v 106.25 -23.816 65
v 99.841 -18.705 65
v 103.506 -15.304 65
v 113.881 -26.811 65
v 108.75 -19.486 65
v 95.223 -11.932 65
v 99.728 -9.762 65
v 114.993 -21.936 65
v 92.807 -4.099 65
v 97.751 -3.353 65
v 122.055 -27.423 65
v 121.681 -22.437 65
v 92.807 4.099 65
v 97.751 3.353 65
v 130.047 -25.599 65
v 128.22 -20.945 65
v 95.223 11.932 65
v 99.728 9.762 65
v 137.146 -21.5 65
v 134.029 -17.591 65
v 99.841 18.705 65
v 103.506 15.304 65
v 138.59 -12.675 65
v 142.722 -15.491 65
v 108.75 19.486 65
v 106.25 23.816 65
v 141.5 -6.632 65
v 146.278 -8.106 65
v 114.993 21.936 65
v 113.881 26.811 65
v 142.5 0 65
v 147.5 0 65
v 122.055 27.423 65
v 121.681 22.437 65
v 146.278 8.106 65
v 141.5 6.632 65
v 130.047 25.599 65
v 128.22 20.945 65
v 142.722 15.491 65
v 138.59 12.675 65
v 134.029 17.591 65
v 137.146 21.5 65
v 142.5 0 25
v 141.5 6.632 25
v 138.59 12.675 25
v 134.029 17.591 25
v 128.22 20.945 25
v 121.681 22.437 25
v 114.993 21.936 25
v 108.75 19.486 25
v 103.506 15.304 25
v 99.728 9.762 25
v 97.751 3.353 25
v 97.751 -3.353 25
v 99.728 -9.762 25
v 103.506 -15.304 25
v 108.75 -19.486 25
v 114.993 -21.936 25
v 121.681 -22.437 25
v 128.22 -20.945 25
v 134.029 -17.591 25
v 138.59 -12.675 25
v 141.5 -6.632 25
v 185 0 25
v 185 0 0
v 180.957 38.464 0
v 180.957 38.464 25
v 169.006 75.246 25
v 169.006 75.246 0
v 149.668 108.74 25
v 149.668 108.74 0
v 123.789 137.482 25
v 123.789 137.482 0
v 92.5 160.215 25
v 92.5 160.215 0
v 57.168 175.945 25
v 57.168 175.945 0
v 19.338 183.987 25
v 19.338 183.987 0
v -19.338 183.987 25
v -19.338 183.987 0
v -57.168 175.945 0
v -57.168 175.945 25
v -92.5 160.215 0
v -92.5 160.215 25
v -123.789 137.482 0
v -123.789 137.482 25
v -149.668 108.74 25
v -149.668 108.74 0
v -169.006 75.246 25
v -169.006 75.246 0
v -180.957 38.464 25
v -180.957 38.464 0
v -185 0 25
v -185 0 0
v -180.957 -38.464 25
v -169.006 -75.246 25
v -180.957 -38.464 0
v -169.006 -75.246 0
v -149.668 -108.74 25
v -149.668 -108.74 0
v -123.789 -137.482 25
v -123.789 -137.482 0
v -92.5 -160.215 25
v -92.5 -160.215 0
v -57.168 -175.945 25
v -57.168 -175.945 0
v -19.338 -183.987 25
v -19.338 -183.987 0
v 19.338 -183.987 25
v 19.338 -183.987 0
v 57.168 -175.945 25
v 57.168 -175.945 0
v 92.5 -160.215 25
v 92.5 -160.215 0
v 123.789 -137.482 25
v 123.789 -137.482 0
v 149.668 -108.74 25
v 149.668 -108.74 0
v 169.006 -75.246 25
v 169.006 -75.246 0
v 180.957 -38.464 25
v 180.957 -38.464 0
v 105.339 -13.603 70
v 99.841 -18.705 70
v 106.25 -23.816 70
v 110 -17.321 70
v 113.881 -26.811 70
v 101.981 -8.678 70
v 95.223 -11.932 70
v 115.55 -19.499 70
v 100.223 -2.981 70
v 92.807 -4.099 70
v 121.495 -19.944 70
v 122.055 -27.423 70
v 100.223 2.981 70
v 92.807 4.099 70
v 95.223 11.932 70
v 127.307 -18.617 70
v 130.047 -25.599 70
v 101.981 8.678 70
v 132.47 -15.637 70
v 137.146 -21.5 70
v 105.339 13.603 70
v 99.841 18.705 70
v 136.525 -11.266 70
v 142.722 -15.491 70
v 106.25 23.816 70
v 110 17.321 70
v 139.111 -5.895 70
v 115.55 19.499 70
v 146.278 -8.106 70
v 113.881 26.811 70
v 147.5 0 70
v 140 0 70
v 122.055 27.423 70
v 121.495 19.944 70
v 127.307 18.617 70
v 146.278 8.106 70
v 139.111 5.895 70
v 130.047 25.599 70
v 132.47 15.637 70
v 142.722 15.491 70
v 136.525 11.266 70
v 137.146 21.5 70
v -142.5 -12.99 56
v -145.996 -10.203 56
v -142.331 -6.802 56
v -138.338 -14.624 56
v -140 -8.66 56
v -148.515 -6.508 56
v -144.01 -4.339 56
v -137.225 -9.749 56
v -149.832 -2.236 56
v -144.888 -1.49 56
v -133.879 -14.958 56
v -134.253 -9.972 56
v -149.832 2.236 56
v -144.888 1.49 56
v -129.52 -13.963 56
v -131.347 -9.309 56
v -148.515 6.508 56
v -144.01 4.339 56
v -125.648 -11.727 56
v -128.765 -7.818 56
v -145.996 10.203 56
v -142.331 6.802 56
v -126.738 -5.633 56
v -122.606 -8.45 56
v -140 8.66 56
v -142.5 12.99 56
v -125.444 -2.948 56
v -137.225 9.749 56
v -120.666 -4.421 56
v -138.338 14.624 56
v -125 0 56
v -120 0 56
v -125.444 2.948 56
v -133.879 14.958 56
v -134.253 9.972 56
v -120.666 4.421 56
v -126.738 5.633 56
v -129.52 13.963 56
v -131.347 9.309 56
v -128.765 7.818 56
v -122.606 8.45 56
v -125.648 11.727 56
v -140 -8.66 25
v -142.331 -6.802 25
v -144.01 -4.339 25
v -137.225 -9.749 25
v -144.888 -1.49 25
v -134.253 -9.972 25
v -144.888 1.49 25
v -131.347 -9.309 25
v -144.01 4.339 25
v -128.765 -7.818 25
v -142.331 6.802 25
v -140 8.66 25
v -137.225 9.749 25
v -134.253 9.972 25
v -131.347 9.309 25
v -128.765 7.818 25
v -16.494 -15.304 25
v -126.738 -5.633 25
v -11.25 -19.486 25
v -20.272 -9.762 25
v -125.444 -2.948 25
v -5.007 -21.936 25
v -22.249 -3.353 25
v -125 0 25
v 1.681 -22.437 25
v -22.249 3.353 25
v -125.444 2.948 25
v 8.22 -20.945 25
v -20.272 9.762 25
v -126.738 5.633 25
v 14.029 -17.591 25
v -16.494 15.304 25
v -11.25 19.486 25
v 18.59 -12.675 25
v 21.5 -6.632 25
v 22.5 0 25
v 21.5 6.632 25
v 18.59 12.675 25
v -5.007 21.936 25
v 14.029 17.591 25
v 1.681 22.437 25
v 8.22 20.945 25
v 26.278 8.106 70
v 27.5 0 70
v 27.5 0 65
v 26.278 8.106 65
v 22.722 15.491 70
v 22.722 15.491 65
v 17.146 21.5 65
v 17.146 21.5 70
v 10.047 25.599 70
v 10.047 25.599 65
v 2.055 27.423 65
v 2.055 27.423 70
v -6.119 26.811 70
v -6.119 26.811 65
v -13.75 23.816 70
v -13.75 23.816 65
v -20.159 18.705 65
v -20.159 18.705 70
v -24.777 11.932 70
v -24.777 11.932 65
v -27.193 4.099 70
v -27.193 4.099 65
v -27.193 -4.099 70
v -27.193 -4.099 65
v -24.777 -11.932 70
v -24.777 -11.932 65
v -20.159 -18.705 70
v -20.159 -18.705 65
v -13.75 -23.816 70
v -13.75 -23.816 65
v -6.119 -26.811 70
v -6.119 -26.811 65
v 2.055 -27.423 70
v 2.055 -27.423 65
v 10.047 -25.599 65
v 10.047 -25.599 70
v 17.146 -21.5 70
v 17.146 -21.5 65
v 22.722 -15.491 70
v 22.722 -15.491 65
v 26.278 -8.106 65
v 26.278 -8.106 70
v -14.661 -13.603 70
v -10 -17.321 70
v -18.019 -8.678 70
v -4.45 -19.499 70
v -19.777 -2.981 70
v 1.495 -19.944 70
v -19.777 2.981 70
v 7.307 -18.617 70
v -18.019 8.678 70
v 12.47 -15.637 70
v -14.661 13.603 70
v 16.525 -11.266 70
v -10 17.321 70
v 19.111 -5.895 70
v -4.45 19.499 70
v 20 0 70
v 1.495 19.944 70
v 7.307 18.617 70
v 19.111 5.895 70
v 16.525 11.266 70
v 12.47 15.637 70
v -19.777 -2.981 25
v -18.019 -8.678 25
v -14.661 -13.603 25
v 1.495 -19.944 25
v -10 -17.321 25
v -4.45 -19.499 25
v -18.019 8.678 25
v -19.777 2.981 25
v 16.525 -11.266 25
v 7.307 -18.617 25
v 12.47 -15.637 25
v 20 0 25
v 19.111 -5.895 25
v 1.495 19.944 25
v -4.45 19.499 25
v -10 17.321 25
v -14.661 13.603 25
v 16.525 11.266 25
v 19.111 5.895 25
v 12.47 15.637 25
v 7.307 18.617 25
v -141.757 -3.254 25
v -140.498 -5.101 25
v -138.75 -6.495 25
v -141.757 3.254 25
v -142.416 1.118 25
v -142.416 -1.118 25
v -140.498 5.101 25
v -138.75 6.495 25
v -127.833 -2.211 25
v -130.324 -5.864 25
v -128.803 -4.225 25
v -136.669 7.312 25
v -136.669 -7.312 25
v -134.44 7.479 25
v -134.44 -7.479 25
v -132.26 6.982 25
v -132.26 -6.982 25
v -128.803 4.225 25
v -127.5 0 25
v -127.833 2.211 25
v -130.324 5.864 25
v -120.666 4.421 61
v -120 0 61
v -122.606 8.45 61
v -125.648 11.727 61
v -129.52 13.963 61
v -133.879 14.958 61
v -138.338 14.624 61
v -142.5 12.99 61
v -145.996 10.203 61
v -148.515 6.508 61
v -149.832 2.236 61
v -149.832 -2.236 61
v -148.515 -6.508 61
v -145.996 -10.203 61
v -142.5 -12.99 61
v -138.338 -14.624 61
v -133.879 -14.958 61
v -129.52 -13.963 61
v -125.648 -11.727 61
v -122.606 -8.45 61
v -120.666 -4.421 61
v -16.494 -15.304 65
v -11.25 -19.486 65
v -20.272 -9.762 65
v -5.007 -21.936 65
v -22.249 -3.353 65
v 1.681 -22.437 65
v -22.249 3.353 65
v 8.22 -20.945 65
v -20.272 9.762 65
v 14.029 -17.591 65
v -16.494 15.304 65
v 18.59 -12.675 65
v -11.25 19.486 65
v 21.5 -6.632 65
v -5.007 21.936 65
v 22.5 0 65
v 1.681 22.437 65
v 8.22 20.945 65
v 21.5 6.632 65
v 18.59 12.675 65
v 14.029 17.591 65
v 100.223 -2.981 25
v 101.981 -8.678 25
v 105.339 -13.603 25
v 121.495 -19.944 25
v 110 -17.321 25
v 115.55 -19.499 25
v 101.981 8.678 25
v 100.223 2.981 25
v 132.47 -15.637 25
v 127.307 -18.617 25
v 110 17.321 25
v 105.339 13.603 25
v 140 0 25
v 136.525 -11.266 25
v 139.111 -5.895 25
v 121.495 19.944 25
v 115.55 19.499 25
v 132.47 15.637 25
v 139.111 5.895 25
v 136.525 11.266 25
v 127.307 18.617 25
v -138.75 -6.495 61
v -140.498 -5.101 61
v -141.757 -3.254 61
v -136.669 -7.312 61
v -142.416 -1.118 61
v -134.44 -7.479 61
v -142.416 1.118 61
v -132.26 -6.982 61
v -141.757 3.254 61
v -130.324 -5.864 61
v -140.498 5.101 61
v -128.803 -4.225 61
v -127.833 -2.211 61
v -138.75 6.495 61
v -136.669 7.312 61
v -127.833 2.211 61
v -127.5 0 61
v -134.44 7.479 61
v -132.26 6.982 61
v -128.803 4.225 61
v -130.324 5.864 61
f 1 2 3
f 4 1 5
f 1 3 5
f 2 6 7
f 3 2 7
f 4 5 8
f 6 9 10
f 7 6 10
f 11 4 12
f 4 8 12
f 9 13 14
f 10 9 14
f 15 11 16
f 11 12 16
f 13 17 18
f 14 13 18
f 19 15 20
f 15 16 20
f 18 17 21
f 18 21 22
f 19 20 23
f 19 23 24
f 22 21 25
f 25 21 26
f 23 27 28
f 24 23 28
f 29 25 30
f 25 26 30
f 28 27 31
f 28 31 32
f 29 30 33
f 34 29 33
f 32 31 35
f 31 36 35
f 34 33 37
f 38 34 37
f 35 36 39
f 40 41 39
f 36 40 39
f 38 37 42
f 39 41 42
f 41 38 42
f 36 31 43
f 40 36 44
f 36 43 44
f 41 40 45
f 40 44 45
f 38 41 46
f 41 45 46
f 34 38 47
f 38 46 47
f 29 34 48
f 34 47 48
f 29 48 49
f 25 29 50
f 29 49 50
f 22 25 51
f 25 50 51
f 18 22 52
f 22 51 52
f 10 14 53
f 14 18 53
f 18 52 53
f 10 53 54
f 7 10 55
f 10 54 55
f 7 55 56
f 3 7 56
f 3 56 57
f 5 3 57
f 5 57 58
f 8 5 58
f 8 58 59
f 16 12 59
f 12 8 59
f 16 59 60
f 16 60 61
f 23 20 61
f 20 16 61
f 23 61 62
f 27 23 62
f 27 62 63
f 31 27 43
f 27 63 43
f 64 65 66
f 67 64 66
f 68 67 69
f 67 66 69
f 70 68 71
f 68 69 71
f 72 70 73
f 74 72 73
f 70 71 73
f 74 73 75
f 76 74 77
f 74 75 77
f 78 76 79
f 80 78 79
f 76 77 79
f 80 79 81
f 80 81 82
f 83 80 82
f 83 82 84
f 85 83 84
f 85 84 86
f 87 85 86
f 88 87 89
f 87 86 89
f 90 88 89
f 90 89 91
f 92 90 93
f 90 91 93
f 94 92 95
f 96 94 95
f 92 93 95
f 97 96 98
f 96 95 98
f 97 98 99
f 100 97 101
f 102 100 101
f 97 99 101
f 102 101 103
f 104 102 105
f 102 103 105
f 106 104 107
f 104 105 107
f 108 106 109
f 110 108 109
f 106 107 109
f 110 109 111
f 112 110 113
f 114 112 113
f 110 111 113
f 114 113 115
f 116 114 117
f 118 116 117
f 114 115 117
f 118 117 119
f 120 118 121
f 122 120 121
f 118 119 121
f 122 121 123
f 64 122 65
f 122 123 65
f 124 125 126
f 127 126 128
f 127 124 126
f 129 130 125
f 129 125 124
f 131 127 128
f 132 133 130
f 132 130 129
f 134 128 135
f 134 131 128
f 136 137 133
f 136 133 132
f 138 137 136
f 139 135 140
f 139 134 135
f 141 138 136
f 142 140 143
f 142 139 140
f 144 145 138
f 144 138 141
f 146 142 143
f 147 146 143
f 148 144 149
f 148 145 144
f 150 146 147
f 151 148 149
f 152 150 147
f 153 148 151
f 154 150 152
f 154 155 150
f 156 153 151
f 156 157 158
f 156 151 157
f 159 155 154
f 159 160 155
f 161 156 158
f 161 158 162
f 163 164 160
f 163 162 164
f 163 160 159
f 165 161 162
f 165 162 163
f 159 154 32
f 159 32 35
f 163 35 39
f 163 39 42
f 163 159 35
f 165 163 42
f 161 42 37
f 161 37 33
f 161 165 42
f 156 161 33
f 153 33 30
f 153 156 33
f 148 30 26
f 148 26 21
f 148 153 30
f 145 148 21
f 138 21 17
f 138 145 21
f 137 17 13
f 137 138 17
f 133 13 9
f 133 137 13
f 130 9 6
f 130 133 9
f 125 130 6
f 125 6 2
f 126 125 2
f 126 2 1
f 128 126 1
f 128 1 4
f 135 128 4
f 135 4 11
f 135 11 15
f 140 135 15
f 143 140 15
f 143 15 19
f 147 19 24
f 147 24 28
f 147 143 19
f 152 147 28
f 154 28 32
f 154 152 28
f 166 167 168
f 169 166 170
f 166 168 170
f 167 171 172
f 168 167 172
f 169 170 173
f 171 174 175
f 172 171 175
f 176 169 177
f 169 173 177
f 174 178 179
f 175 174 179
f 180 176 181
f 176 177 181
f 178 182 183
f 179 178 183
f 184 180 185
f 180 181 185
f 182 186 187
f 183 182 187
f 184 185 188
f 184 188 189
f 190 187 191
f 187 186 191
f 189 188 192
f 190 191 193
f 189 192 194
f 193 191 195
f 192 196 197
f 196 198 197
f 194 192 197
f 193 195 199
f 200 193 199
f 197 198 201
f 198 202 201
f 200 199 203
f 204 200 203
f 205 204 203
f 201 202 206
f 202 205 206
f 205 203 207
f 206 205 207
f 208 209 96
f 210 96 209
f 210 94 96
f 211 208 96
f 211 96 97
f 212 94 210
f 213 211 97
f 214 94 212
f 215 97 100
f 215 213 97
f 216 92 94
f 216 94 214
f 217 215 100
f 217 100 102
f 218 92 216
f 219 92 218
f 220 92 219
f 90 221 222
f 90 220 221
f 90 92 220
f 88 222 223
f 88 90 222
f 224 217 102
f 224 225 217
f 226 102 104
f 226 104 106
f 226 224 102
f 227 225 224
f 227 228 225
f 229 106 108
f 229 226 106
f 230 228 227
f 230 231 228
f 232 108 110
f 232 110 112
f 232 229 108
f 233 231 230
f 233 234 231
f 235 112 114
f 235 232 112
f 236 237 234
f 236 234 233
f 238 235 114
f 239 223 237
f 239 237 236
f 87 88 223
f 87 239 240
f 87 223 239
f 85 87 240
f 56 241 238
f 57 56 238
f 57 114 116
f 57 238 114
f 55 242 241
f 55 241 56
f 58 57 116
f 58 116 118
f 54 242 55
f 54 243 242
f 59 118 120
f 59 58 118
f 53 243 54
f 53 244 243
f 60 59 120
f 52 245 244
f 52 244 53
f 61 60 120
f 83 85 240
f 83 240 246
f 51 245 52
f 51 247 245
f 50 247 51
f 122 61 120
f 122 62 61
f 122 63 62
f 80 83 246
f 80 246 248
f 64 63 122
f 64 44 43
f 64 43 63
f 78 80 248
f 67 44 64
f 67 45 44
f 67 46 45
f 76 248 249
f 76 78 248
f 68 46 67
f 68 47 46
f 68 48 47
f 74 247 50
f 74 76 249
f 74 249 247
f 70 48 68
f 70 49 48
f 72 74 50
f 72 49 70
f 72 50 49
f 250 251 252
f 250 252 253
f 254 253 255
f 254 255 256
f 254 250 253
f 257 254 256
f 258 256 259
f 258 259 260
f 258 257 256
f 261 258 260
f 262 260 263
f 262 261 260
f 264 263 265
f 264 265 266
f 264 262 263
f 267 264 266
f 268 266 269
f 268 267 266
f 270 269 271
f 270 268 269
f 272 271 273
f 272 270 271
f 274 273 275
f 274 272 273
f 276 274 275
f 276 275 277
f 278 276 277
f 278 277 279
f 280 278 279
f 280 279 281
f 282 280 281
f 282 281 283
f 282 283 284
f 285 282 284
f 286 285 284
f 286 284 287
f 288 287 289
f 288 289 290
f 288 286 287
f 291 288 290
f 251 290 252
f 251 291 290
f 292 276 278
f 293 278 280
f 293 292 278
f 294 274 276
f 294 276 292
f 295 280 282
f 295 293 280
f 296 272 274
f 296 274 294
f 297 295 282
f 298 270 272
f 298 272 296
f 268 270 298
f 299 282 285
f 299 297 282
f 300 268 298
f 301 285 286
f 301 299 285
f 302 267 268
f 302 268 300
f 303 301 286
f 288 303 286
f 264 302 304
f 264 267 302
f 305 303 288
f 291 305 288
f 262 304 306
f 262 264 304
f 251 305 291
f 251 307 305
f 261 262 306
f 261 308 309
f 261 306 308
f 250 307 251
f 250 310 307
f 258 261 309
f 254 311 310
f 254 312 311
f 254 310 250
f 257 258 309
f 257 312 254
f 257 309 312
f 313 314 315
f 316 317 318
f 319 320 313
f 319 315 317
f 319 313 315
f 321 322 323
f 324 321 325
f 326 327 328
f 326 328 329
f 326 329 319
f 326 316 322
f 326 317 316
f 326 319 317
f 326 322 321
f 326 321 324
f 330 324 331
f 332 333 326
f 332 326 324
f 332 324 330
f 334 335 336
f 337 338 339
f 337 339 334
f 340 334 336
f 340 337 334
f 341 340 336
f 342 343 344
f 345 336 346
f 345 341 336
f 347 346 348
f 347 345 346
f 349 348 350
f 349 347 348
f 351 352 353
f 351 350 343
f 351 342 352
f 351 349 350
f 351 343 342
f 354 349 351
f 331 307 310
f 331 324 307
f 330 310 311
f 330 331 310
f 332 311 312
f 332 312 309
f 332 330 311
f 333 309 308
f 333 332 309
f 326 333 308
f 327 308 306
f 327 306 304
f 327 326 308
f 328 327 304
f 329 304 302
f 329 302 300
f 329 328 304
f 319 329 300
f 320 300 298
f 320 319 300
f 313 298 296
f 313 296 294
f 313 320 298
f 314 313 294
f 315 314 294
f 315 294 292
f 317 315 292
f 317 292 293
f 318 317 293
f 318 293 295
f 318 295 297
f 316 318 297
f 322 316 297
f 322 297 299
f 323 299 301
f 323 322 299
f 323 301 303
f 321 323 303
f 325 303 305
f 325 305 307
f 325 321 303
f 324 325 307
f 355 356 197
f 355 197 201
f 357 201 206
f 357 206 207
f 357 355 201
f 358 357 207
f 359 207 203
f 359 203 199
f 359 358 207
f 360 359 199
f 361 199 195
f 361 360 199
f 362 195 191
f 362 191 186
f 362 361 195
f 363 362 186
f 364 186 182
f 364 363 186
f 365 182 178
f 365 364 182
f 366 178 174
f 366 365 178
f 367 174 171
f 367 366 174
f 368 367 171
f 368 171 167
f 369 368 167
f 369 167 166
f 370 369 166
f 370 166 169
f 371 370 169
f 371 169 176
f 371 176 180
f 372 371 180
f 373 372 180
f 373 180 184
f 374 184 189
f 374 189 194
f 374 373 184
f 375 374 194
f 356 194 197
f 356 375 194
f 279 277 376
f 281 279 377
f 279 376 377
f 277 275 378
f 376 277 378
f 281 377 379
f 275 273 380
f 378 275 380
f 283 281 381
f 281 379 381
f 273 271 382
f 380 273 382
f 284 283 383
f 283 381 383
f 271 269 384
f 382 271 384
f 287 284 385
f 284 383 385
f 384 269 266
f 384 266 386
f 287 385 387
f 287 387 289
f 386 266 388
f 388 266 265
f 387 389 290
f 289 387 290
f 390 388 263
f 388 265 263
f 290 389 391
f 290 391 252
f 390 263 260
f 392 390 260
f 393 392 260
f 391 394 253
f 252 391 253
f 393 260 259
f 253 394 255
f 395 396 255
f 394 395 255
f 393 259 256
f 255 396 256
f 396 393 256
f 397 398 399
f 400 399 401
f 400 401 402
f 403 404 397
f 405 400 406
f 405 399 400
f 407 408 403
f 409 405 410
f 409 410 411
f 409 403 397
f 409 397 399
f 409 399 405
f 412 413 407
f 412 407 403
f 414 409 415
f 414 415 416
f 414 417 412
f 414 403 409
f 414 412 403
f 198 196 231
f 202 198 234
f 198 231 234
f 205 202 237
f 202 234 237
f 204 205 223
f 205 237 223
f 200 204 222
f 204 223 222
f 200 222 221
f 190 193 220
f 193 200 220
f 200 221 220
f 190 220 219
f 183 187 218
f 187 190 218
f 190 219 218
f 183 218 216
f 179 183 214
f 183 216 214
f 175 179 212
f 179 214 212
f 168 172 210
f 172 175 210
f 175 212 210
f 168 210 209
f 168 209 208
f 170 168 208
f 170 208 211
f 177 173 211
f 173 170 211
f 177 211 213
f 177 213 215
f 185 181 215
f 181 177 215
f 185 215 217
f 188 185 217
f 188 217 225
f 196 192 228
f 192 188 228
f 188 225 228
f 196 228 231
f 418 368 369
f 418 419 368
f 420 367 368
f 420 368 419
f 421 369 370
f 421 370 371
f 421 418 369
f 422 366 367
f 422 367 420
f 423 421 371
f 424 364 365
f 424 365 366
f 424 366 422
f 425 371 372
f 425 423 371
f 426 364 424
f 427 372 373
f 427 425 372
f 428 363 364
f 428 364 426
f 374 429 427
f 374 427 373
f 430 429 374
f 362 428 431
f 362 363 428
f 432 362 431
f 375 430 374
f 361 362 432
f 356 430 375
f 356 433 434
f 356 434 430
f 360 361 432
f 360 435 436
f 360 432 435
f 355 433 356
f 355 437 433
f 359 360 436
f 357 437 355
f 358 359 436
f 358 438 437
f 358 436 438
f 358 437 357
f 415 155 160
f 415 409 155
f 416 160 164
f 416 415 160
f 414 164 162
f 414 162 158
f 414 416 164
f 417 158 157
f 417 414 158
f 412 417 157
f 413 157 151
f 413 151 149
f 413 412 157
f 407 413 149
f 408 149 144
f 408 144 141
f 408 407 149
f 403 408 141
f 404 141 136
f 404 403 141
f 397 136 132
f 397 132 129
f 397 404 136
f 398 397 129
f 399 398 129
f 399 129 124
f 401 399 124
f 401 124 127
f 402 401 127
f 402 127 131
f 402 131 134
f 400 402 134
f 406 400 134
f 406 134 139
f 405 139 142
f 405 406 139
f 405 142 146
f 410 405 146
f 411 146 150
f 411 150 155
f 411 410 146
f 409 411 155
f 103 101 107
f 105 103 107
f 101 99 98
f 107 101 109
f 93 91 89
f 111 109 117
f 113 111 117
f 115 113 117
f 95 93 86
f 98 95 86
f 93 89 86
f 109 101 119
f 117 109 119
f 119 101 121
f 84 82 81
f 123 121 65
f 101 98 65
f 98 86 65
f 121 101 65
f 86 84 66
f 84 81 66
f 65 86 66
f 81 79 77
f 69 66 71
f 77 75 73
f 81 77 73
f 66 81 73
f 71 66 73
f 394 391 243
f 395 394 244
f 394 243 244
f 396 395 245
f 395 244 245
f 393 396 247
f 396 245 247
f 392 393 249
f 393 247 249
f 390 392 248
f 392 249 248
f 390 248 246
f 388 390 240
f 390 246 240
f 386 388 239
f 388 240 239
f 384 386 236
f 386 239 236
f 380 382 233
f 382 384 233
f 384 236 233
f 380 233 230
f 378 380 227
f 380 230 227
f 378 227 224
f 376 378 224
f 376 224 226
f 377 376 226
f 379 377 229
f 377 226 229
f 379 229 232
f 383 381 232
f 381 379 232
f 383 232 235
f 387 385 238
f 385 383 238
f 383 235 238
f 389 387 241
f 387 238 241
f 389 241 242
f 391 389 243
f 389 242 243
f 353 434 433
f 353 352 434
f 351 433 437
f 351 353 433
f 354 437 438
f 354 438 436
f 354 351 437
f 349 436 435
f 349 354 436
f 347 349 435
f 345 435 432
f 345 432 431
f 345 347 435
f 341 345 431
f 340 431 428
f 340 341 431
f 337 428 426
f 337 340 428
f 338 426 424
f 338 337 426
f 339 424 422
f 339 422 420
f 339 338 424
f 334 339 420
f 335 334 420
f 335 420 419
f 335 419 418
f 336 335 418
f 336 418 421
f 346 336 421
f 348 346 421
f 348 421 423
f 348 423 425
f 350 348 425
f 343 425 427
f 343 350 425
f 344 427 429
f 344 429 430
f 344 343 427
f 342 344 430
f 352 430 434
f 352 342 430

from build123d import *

# Parameters (mm, degrees)
F0_R        = 185
F1_DEPTH    = 25
F2_R        = 22.5
F2_R_2      = 20
F3_DEPTH    = 40
F2_R_3      = 10
F2_R_4      = 7.5
F4_DEPTH    = 36
F3_FACE_R   = 22.5
F3_FACE_R_2 = 20
F5_DEPTH    = 5
F6_R        = 27.5
F6_R_2      = 20
F7_DEPTH    = 5
F8_R        = 15
F8_R_2      = 7.5
F9_DEPTH    = 5


with BuildPart() as f1:
    # F0 (on Top) → F1 (new body)
    with BuildSketch(Plane.XY):
        Circle(F0_R)
    extrude(amount=F1_DEPTH)

    # F2 (on face) → F3 (join)
    with BuildSketch(Plane.XY.offset(25)):
        Circle(F2_R)
        Circle(F2_R_2, mode=Mode.SUBTRACT)
        with Locations((120, 0)):
            Circle(F2_R)
        with Locations((120, 0)):
            Circle(F2_R_2, mode=Mode.SUBTRACT)
    extrude(amount=F3_DEPTH)

    # F2 (on face) → F4 (join)
    with BuildSketch(Plane.XY.offset(25)):
        with Locations((120, 0)):
            Circle(F2_R)
        with Locations((120, 0)):
            Circle(F2_R_2, mode=Mode.SUBTRACT)
        Circle(F2_R)
        Circle(F2_R_2, mode=Mode.SUBTRACT)
        with Locations((-135, 0)):
            Circle(F2_R_3)
        with Locations((-135, 0)):
            Circle(F2_R_4, mode=Mode.SUBTRACT)
    extrude(amount=F4_DEPTH)

    # F3_face (on face) → F5 (join)
    with BuildSketch(Plane.XY.offset(65)):
        Circle(F3_FACE_R)
        Circle(F3_FACE_R_2, mode=Mode.SUBTRACT)
        with Locations((120, 0)):
            Circle(F3_FACE_R)
        with Locations((120, 0)):
            Circle(F3_FACE_R_2, mode=Mode.SUBTRACT)
    extrude(amount=F5_DEPTH)

    # F6 (on face) → F7 (join)
    with BuildSketch(Plane.XY.offset(70)):
        with Locations((120, 0)):
            Circle(F6_R)
        with Locations((120, 0)):
            Circle(F6_R_2, mode=Mode.SUBTRACT)
        Circle(F6_R)
        Circle(F6_R_2, mode=Mode.SUBTRACT)
    extrude(amount=-F7_DEPTH)

    # F8 (on face) → F9 (join)
    with BuildSketch(Plane.XY.offset(61)):
        with Locations((-135, 0)):
            Circle(F8_R)
        with Locations((-135, 0)):
            Circle(F8_R_2, mode=Mode.SUBTRACT)
    extrude(amount=-F9_DEPTH)


solid = f1.part
